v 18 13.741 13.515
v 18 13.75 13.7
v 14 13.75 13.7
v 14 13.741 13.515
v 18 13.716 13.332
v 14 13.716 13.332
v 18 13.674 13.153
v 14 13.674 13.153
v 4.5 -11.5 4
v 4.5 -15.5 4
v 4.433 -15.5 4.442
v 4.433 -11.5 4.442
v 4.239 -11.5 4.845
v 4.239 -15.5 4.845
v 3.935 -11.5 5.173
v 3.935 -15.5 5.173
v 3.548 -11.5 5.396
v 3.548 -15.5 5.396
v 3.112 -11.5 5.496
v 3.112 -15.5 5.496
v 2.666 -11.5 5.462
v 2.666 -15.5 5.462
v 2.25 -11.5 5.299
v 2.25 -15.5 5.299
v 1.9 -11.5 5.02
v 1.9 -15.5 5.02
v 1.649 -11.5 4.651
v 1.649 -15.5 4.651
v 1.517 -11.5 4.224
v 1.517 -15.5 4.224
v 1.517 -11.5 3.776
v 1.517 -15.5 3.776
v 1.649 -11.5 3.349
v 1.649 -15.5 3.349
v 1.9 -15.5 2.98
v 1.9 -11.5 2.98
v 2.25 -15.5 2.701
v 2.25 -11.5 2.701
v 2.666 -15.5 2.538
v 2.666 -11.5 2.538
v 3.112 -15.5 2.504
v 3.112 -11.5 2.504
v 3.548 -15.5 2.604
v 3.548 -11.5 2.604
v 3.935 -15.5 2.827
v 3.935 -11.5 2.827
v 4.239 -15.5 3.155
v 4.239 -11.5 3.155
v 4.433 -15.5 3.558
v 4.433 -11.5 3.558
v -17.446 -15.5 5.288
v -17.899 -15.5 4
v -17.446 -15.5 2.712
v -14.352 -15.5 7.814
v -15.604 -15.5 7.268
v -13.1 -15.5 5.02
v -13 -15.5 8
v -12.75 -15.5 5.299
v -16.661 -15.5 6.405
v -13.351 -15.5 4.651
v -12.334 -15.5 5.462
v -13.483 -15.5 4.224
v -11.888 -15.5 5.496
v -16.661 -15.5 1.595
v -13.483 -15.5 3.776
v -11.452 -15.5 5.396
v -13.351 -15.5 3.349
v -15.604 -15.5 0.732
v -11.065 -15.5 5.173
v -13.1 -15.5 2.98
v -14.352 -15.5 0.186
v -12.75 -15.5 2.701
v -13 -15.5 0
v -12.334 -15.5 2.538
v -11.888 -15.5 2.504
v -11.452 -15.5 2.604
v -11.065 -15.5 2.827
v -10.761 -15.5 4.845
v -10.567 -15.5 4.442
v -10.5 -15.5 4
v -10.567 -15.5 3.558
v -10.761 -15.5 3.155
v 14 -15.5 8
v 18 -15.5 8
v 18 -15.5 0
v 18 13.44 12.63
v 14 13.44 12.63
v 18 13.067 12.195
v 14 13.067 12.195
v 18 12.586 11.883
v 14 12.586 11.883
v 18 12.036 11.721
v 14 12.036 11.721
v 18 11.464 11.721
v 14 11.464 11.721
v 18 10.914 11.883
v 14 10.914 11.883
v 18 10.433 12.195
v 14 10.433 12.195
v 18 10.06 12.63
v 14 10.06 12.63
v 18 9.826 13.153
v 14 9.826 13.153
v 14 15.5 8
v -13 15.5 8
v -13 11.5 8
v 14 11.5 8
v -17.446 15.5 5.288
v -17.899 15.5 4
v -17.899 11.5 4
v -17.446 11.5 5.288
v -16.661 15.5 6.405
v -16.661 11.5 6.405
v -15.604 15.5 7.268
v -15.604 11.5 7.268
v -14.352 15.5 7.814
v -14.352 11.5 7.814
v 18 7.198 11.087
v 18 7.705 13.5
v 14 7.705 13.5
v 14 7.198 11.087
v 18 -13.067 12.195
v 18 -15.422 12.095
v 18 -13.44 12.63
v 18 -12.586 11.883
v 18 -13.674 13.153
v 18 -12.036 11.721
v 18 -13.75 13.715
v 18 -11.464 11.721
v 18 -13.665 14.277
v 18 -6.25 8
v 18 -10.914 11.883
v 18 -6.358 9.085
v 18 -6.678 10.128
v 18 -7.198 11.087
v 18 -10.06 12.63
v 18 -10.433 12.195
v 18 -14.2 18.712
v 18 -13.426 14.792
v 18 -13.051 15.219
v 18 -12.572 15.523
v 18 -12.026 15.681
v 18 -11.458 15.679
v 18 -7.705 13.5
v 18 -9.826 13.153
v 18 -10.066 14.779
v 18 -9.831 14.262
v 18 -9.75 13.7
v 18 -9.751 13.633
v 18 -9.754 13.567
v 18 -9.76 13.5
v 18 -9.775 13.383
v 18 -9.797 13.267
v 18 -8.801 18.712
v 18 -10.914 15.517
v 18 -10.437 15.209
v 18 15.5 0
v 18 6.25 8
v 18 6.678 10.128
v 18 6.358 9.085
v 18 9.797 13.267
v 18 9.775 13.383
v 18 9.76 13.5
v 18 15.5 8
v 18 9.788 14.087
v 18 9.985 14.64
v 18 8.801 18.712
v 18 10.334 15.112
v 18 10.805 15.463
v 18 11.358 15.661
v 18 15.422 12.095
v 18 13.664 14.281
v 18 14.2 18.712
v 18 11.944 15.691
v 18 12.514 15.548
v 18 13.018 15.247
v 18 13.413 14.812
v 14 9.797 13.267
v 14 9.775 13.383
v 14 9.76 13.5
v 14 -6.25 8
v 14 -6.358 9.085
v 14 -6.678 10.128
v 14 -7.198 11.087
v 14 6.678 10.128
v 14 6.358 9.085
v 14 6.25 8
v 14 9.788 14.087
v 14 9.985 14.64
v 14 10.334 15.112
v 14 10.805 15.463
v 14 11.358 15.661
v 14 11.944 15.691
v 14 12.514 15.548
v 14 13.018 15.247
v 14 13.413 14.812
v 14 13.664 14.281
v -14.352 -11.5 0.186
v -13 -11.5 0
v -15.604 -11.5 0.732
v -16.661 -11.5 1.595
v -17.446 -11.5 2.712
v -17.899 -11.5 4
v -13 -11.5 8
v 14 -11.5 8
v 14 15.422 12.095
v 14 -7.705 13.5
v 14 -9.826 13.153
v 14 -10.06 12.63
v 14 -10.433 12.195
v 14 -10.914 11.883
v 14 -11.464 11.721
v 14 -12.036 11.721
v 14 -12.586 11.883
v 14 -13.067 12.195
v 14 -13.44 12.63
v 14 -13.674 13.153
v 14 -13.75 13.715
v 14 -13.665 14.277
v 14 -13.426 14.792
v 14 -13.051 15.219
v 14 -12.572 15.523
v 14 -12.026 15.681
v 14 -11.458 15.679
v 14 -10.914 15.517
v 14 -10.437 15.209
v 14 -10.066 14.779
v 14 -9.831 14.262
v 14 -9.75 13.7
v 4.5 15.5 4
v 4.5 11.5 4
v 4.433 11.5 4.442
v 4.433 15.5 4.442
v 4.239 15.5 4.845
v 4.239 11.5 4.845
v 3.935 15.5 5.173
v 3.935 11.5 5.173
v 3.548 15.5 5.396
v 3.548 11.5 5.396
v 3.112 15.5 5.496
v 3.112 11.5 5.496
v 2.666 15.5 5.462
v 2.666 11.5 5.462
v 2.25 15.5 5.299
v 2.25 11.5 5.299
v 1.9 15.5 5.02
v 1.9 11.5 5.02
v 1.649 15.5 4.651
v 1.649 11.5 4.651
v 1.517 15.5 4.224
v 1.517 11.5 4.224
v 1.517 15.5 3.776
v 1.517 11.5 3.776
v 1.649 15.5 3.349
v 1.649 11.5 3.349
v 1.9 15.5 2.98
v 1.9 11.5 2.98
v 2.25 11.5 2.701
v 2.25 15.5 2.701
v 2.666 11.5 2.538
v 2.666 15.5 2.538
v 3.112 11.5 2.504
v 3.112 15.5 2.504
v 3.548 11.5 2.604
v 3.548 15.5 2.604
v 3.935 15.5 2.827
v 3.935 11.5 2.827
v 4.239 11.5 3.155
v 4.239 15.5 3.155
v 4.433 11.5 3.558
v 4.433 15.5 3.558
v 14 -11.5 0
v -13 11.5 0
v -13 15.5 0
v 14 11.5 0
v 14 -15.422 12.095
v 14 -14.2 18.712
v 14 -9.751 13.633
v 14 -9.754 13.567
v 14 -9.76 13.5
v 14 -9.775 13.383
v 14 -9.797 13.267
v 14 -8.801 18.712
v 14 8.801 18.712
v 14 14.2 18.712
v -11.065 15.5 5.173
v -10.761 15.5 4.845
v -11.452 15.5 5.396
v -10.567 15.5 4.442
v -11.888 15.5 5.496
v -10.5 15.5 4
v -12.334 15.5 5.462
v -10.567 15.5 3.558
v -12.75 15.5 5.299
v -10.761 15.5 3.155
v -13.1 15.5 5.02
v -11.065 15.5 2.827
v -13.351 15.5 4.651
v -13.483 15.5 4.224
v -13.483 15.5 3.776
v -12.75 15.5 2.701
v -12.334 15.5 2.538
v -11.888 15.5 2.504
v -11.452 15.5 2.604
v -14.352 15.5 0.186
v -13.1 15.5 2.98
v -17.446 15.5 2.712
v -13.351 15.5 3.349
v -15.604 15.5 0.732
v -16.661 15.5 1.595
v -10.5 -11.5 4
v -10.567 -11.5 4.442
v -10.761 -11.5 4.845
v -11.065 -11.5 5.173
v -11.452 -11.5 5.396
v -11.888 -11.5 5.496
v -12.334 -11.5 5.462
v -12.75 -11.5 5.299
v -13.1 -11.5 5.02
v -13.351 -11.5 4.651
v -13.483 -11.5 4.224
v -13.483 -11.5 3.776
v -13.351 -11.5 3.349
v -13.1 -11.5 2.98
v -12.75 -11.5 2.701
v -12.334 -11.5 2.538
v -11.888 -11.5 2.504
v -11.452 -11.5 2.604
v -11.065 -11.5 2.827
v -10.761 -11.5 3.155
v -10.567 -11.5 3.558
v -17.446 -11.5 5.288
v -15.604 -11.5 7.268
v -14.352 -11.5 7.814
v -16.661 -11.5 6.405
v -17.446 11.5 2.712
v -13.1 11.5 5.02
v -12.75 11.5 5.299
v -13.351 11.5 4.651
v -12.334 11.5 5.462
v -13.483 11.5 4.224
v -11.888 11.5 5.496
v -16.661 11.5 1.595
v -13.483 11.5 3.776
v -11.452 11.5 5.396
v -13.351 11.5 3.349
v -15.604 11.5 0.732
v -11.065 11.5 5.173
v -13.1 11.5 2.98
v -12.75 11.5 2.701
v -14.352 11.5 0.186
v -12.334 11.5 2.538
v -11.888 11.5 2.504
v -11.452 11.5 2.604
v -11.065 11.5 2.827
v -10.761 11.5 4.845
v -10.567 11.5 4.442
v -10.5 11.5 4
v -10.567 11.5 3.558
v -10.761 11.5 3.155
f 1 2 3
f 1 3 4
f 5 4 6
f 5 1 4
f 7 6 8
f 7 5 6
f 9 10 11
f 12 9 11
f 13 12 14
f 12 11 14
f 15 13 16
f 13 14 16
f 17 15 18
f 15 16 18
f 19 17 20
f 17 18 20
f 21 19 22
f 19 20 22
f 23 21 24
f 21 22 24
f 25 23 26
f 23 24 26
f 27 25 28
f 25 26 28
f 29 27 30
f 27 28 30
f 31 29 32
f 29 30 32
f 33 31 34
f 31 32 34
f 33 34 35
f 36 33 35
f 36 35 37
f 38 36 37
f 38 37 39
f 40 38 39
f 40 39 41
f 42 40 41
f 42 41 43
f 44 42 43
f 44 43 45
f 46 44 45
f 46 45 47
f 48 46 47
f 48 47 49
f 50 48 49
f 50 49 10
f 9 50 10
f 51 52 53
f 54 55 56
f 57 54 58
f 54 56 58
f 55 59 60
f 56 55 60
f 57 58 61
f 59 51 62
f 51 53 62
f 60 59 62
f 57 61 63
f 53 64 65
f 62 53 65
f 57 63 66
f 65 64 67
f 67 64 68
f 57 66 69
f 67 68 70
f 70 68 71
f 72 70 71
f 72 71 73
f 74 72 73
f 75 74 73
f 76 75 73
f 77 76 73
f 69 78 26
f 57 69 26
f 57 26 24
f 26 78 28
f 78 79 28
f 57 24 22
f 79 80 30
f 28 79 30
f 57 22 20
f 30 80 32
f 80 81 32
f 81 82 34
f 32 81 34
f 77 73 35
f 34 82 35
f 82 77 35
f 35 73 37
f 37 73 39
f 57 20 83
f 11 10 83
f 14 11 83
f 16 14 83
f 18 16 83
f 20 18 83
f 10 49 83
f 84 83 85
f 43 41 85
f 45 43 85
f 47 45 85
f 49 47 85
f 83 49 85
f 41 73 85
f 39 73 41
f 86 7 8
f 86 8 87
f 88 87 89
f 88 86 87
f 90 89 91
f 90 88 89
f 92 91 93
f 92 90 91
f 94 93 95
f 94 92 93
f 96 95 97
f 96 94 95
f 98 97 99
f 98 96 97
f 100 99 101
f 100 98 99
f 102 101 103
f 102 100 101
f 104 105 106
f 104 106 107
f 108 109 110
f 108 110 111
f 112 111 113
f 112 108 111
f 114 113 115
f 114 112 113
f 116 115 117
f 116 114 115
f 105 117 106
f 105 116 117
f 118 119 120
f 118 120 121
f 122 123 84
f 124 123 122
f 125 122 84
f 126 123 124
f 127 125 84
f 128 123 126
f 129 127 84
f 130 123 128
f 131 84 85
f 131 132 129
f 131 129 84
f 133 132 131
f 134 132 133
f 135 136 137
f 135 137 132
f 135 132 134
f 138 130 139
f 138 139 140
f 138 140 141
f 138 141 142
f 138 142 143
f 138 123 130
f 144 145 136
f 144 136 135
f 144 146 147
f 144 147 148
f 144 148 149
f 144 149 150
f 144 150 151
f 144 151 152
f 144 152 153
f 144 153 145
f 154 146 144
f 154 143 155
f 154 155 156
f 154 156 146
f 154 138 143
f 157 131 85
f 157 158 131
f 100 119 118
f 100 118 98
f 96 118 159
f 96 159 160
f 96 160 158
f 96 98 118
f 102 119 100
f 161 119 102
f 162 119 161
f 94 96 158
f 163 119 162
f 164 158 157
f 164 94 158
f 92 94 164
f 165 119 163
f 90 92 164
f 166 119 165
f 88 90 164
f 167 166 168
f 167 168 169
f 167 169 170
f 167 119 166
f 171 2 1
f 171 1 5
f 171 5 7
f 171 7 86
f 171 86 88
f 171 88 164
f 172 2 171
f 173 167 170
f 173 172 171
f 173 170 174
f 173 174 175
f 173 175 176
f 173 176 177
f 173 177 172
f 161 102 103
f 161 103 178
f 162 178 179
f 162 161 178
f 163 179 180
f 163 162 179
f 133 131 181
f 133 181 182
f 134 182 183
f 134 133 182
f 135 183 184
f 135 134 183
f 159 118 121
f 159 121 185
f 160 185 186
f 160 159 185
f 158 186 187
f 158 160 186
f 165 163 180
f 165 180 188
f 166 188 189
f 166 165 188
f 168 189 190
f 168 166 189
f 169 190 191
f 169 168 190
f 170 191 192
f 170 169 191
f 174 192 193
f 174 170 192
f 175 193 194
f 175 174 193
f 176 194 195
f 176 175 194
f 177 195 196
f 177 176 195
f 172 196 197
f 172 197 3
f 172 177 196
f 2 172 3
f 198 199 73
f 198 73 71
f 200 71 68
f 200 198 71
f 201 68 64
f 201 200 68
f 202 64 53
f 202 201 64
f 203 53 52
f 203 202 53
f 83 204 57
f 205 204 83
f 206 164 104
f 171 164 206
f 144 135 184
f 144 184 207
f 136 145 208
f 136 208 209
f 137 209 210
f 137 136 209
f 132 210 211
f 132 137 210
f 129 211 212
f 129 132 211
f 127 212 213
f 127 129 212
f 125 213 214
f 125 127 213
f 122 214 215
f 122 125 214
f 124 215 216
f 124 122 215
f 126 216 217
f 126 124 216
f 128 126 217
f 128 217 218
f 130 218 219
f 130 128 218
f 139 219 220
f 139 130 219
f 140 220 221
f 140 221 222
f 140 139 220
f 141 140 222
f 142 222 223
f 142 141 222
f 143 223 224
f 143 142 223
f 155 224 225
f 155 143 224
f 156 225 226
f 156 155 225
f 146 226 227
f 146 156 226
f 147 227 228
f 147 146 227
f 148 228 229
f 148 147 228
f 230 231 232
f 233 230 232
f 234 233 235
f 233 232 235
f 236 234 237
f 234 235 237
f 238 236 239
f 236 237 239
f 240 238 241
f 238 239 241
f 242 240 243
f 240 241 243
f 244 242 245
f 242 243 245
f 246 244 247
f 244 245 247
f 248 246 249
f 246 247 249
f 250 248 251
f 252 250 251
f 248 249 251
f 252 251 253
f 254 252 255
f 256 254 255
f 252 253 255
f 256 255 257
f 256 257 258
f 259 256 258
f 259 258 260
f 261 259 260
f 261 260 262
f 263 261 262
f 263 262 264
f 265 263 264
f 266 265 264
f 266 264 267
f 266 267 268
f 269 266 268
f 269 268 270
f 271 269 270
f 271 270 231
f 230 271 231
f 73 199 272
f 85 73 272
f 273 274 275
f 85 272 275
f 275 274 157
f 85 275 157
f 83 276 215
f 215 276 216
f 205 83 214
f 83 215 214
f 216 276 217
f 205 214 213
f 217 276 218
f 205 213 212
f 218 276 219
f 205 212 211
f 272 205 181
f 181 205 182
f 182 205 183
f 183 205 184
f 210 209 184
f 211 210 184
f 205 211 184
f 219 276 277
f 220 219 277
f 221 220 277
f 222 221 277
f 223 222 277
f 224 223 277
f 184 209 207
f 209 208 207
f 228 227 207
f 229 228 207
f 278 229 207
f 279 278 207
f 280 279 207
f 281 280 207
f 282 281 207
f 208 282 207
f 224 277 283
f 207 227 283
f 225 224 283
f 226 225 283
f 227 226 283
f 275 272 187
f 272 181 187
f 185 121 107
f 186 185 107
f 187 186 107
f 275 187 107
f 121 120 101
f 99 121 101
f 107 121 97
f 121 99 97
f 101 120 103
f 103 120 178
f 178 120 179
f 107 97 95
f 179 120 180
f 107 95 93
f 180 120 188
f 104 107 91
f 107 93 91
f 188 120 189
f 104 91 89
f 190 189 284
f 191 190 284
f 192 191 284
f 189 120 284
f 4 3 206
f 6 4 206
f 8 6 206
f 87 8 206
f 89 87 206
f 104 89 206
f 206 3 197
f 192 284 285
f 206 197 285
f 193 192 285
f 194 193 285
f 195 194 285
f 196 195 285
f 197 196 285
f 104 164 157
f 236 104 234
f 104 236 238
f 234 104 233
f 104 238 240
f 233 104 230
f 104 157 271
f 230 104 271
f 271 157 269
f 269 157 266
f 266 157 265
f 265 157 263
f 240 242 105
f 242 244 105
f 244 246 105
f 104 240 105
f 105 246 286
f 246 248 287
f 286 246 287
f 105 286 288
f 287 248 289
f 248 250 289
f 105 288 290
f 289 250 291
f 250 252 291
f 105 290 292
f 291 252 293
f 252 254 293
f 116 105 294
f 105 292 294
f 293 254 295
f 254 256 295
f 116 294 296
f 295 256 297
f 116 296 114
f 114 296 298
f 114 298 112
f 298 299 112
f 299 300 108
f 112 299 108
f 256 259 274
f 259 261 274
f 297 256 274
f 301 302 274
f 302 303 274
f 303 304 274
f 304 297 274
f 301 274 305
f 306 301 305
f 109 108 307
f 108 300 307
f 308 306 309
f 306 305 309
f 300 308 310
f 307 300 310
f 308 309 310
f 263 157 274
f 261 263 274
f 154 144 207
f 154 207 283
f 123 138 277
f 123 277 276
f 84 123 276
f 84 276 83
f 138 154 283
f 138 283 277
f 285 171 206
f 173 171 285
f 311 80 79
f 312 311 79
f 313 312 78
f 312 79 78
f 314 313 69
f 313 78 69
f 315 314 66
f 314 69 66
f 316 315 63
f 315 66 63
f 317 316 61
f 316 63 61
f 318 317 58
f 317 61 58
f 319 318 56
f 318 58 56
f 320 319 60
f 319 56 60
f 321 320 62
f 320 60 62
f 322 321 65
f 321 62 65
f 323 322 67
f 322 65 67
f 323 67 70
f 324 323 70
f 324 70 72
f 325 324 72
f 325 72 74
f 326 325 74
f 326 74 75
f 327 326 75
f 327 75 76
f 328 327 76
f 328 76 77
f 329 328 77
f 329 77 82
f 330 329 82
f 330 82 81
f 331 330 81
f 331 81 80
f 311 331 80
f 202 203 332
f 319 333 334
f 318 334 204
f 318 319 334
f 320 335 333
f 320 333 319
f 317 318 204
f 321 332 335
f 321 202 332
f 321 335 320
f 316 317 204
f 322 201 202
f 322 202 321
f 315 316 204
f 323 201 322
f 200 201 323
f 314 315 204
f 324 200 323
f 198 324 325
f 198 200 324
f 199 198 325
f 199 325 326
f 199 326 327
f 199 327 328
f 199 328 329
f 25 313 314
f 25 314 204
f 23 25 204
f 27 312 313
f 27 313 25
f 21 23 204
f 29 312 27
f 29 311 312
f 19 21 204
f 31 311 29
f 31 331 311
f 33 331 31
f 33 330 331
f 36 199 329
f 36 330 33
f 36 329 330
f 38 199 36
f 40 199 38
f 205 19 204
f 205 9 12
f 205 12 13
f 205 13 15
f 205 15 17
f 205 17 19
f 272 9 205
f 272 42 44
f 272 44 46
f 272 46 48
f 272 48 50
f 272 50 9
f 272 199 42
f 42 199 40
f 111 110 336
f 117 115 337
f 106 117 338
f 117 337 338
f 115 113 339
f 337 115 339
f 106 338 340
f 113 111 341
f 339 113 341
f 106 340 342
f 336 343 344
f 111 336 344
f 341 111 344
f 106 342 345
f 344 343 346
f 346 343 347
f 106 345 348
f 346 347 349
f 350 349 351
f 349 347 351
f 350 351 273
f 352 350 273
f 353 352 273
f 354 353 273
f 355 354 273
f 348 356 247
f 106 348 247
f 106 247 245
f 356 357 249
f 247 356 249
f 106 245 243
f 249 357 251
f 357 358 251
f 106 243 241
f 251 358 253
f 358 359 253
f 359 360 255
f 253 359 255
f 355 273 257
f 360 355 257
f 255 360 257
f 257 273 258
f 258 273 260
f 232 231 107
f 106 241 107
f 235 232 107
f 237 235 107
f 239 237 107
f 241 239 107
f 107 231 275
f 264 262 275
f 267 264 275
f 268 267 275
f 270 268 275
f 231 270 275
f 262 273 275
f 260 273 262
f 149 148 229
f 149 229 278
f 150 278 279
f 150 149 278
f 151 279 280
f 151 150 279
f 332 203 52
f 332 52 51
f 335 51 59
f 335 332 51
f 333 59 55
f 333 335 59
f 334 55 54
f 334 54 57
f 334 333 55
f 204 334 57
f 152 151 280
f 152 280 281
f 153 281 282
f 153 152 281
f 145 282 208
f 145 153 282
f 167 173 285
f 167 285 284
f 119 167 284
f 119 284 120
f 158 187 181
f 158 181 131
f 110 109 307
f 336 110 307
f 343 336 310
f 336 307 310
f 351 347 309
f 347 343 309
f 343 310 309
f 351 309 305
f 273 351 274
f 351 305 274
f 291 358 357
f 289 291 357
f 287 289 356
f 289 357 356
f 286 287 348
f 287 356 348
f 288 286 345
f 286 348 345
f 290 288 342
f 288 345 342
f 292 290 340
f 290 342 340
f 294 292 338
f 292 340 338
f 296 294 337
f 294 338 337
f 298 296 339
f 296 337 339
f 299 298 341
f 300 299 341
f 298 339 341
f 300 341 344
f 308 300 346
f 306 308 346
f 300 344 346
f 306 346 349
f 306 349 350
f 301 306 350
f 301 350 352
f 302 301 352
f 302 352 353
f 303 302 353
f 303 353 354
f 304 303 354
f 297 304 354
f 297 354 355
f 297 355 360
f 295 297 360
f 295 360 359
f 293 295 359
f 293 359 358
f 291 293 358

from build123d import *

# Parameters (mm, degrees)
F0_W        = 32
F0_H        = 4
F1_DEPTH    = 8
F3_DEPTH    = 4
F4_DEPTH    = 25
F5_R        = 1.5
F6_DEPTH    = 40
F7_T1_DEPTH = 29
F7_T3_DEPTH = 29


# Not quite as in the source:
# - a fillet or chamfer that OpenCascade refuses, or shapes differently, is made with other operations: its cross-section is extruded or revolved along the edge and cut away or added


with BuildPart() as f1:
    # F0 (on Top) → F1 (new body)
    with BuildSketch(Plane.XY):
        with Locations((-2, 13.5)):
            Rectangle(F0_W, F0_H)
        Polygon((14, 11.5), (14, -11.5), (14, -15.5), (18, -15.5), (18, 0), (18, 15.5), (14, 15.5), align=None)
        with Locations((-2, -13.5)):
            Rectangle(F0_W, F0_H)
    extrude(amount=F1_DEPTH)

    # F2 (on face) → F3 (join, through all)
    with BuildSketch(Plane.YZ.offset(18)):
        with BuildLine():
            Line((-15.4216540828, 12.0949916113), (-15.5, 8))
            Line((-15.5, 8), (-6.25, 8))
            ThreePointArc((-6.25, 8), (-6.4923756022, 9.6147401314), (-7.1981402517, 11.0871625858))
            ThreePointArc((-7.1981402517, 11.0871625858), (-8.3515353126, 12.3244002785), (-9.8263607896, 13.1526315789))
            ThreePointArc((-9.8263607896, 13.1526315789), (-11.75, 11.7), (-13.6736392104, 13.1526315789))
            ThreePointArc((-13.6736392104, 13.1526315789), (-14.5971876184, 12.7056904558), (-15.4216540828, 12.0949916113))
        make_face()
        with BuildLine():
            Line((6.25, 8), (11.75, 8))
            Line((11.75, 8), (15.5, 8))
            Line((15.5, 8), (15.4216540828, 12.0949916113))
            ThreePointArc((15.4216540828, 12.0949916113), (14.5971876184, 12.7056904558), (13.6736392104, 13.1526315789))
            ThreePointArc((13.6736392104, 13.1526315789), (11.75, 11.7), (9.8263607896, 13.1526315789))
            ThreePointArc((9.8263607896, 13.1526315789), (8.3515353126, 12.3244002785), (7.1981402517, 11.0871625858))
            ThreePointArc((7.1981402517, 11.0871625858), (6.4923756022, 9.6147401314), (6.25, 8))
        make_face()
        with BuildLine():
            Line((-14.1999293119, 18.7123082578), (-15.4216540828, 12.0949916113))
            ThreePointArc((-15.4216540828, 12.0949916113), (-14.5971876184, 12.7056904558), (-13.6736392104, 13.1526315789))
            ThreePointArc((-13.6736392104, 13.1526315789), (-12.0263345611, 15.6808178135), (-9.75, 13.7))
            ThreePointArc((-9.75, 13.7), (-9.7525078538, 13.5998744499), (-9.7600251258, 13.5))
            Line((-9.7600251258, 13.5), (-7.7054746686, 13.5))
            Line((-7.7054746686, 13.5), (-8.8014388457, 18.7123082578))
            Line((-8.8014388457, 18.7123082578), (-14.1999293119, 18.7123082578))
        make_face()
        with BuildLine():
            ThreePointArc((-9.8263607896, 13.1526315789), (-8.3515353126, 12.3244002785), (-7.1981402517, 11.0871625858))
            Line((-7.1981402517, 11.0871625858), (-7.7054746686, 13.5))
            Line((-7.7054746686, 13.5), (-9.7600251258, 13.5))
            ThreePointArc((-9.7600251258, 13.5), (-9.7855000622, 13.3248467056), (-9.8263607896, 13.1526315789))
        make_face()
        with BuildLine():
            ThreePointArc((13.6736392104, 13.1526315789), (14.5971876184, 12.7056904558), (15.4216540828, 12.0949916113))
            Line((15.4216540828, 12.0949916113), (14.1999293119, 18.7123082578))
            Line((14.1999293119, 18.7123082578), (8.8014388457, 18.7123082578))
            Line((8.8014388457, 18.7123082578), (7.7054746686, 13.5))
            Line((7.7054746686, 13.5), (9.7600251258, 13.5))
            ThreePointArc((9.7600251258, 13.5), (11.6498744499, 15.6974921462), (13.75, 13.7))
            ThreePointArc((13.75, 13.7), (13.7308178135, 13.4236654389), (13.6736392104, 13.1526315789))
        make_face()
        with BuildLine():
            Line((7.7054746686, 13.5), (7.1981402517, 11.0871625858))
            ThreePointArc((7.1981402517, 11.0871625858), (8.3515353126, 12.3244002785), (9.8263607896, 13.1526315789))
            ThreePointArc((9.8263607896, 13.1526315789), (9.7855000622, 13.3248467056), (9.7600251258, 13.5))
            Line((9.7600251258, 13.5), (7.7054746686, 13.5))
        make_face()
    extrude(amount=-F3_DEPTH)

    # F2 (on face) → F4 (cut)
    with BuildSketch(Plane.YZ.offset(18)):
        with BuildLine():
            ThreePointArc((9.7600251258, 13.5), (9.7855000622, 13.3248467056), (9.8263607896, 13.1526315789))
            ThreePointArc((9.8263607896, 13.1526315789), (10.7726243517, 13.4124612555), (11.75, 13.5))
            Line((11.75, 13.5), (9.7600251258, 13.5))
        make_face()
        with BuildLine():
            ThreePointArc((11.75, 13.5), (10.7726243517, 13.4124612555), (9.8263607896, 13.1526315789))
            ThreePointArc((9.8263607896, 13.1526315789), (11.75, 11.7), (13.6736392104, 13.1526315789))
            ThreePointArc((13.6736392104, 13.1526315789), (12.7273756483, 13.4124612555), (11.75, 13.5))
        make_face()
        with BuildLine():
            ThreePointArc((11.75, 13.5), (12.7273756483, 13.4124612555), (13.6736392104, 13.1526315789))
            ThreePointArc((13.6736392104, 13.1526315789), (13.7308178135, 13.4236654389), (13.75, 13.7))
            ThreePointArc((13.75, 13.7), (11.6498744499, 15.6974921462), (9.7600251258, 13.5))
            Line((9.7600251258, 13.5), (11.75, 13.5))
        make_face()
        with BuildLine():
            ThreePointArc((-11.75, 13.5), (-12.7273756483, 13.4124612555), (-13.6736392104, 13.1526315789))
            ThreePointArc((-13.6736392104, 13.1526315789), (-11.75, 11.7), (-9.8263607896, 13.1526315789))
            ThreePointArc((-9.8263607896, 13.1526315789), (-10.7726243517, 13.4124612555), (-11.75, 13.5))
        make_face()
        with BuildLine():
            ThreePointArc((-11.75, 13.5), (-10.7726243517, 13.4124612555), (-9.8263607896, 13.1526315789))
            ThreePointArc((-9.8263607896, 13.1526315789), (-9.7855000622, 13.3248467056), (-9.7600251258, 13.5))
            Line((-9.7600251258, 13.5), (-11.75, 13.5))
        make_face()
        with BuildLine():
            ThreePointArc((-9.75, 13.7), (-12.0263345611, 15.6808178135), (-13.6736392104, 13.1526315789))
            ThreePointArc((-13.6736392104, 13.1526315789), (-12.7273756483, 13.4124612555), (-11.75, 13.5))
            Line((-11.75, 13.5), (-9.7600251258, 13.5))
            ThreePointArc((-9.7600251258, 13.5), (-9.7525078538, 13.5998744499), (-9.75, 13.7))
        make_face()
    extrude(amount=-F4_DEPTH, mode=Mode.SUBTRACT)

    # F5 (on face) → F6 (cut)
    with BuildSketch(Plane.XZ.offset(15.5)):
        with Locations((-12, 4)):
            Circle(F5_R)
        with Locations((3, 4)):
            Circle(F5_R)
    extrude(amount=-F6_DEPTH, mode=Mode.SUBTRACT)

    # F7: fillet of radius 5 on 4 edges, made by hand

    # F7_s2 → F7_t1 (cut)
    with BuildSketch(Plane.XZ.offset(-1)):
        with BuildLine():
            ThreePointArc((-18, 3), (-16.5355339059, 6.5355339059), (-13, 8))
            Line((-13, 8), (-18, 8))
            Line((-18, 8), (-18, 3))
        make_face()
        with BuildLine():
            ThreePointArc((-13, 0), (-16.5355339059, 1.4644660941), (-18, 5))
            Line((-18, 5), (-18, 0))
            Line((-18, 0), (-13, 0))
        make_face()
    extrude(amount=F7_T1_DEPTH, mode=Mode.SUBTRACT)

    # F7_s4 → F7_t3 (cut)
    with BuildSketch(Plane.XZ.offset(-28)):
        with BuildLine():
            ThreePointArc((-18, 3), (-16.5355339059, 6.5355339059), (-13, 8))
            Line((-13, 8), (-18, 8))
            Line((-18, 8), (-18, 3))
        make_face()
        with BuildLine():
            ThreePointArc((-18, 5), (-16.5355339059, 1.4644660941), (-13, 0))
            Line((-13, 0), (-18, 0))
            Line((-18, 0), (-18, 5))
        make_face()
    extrude(amount=F7_T3_DEPTH, mode=Mode.SUBTRACT)


solid = f1.part
